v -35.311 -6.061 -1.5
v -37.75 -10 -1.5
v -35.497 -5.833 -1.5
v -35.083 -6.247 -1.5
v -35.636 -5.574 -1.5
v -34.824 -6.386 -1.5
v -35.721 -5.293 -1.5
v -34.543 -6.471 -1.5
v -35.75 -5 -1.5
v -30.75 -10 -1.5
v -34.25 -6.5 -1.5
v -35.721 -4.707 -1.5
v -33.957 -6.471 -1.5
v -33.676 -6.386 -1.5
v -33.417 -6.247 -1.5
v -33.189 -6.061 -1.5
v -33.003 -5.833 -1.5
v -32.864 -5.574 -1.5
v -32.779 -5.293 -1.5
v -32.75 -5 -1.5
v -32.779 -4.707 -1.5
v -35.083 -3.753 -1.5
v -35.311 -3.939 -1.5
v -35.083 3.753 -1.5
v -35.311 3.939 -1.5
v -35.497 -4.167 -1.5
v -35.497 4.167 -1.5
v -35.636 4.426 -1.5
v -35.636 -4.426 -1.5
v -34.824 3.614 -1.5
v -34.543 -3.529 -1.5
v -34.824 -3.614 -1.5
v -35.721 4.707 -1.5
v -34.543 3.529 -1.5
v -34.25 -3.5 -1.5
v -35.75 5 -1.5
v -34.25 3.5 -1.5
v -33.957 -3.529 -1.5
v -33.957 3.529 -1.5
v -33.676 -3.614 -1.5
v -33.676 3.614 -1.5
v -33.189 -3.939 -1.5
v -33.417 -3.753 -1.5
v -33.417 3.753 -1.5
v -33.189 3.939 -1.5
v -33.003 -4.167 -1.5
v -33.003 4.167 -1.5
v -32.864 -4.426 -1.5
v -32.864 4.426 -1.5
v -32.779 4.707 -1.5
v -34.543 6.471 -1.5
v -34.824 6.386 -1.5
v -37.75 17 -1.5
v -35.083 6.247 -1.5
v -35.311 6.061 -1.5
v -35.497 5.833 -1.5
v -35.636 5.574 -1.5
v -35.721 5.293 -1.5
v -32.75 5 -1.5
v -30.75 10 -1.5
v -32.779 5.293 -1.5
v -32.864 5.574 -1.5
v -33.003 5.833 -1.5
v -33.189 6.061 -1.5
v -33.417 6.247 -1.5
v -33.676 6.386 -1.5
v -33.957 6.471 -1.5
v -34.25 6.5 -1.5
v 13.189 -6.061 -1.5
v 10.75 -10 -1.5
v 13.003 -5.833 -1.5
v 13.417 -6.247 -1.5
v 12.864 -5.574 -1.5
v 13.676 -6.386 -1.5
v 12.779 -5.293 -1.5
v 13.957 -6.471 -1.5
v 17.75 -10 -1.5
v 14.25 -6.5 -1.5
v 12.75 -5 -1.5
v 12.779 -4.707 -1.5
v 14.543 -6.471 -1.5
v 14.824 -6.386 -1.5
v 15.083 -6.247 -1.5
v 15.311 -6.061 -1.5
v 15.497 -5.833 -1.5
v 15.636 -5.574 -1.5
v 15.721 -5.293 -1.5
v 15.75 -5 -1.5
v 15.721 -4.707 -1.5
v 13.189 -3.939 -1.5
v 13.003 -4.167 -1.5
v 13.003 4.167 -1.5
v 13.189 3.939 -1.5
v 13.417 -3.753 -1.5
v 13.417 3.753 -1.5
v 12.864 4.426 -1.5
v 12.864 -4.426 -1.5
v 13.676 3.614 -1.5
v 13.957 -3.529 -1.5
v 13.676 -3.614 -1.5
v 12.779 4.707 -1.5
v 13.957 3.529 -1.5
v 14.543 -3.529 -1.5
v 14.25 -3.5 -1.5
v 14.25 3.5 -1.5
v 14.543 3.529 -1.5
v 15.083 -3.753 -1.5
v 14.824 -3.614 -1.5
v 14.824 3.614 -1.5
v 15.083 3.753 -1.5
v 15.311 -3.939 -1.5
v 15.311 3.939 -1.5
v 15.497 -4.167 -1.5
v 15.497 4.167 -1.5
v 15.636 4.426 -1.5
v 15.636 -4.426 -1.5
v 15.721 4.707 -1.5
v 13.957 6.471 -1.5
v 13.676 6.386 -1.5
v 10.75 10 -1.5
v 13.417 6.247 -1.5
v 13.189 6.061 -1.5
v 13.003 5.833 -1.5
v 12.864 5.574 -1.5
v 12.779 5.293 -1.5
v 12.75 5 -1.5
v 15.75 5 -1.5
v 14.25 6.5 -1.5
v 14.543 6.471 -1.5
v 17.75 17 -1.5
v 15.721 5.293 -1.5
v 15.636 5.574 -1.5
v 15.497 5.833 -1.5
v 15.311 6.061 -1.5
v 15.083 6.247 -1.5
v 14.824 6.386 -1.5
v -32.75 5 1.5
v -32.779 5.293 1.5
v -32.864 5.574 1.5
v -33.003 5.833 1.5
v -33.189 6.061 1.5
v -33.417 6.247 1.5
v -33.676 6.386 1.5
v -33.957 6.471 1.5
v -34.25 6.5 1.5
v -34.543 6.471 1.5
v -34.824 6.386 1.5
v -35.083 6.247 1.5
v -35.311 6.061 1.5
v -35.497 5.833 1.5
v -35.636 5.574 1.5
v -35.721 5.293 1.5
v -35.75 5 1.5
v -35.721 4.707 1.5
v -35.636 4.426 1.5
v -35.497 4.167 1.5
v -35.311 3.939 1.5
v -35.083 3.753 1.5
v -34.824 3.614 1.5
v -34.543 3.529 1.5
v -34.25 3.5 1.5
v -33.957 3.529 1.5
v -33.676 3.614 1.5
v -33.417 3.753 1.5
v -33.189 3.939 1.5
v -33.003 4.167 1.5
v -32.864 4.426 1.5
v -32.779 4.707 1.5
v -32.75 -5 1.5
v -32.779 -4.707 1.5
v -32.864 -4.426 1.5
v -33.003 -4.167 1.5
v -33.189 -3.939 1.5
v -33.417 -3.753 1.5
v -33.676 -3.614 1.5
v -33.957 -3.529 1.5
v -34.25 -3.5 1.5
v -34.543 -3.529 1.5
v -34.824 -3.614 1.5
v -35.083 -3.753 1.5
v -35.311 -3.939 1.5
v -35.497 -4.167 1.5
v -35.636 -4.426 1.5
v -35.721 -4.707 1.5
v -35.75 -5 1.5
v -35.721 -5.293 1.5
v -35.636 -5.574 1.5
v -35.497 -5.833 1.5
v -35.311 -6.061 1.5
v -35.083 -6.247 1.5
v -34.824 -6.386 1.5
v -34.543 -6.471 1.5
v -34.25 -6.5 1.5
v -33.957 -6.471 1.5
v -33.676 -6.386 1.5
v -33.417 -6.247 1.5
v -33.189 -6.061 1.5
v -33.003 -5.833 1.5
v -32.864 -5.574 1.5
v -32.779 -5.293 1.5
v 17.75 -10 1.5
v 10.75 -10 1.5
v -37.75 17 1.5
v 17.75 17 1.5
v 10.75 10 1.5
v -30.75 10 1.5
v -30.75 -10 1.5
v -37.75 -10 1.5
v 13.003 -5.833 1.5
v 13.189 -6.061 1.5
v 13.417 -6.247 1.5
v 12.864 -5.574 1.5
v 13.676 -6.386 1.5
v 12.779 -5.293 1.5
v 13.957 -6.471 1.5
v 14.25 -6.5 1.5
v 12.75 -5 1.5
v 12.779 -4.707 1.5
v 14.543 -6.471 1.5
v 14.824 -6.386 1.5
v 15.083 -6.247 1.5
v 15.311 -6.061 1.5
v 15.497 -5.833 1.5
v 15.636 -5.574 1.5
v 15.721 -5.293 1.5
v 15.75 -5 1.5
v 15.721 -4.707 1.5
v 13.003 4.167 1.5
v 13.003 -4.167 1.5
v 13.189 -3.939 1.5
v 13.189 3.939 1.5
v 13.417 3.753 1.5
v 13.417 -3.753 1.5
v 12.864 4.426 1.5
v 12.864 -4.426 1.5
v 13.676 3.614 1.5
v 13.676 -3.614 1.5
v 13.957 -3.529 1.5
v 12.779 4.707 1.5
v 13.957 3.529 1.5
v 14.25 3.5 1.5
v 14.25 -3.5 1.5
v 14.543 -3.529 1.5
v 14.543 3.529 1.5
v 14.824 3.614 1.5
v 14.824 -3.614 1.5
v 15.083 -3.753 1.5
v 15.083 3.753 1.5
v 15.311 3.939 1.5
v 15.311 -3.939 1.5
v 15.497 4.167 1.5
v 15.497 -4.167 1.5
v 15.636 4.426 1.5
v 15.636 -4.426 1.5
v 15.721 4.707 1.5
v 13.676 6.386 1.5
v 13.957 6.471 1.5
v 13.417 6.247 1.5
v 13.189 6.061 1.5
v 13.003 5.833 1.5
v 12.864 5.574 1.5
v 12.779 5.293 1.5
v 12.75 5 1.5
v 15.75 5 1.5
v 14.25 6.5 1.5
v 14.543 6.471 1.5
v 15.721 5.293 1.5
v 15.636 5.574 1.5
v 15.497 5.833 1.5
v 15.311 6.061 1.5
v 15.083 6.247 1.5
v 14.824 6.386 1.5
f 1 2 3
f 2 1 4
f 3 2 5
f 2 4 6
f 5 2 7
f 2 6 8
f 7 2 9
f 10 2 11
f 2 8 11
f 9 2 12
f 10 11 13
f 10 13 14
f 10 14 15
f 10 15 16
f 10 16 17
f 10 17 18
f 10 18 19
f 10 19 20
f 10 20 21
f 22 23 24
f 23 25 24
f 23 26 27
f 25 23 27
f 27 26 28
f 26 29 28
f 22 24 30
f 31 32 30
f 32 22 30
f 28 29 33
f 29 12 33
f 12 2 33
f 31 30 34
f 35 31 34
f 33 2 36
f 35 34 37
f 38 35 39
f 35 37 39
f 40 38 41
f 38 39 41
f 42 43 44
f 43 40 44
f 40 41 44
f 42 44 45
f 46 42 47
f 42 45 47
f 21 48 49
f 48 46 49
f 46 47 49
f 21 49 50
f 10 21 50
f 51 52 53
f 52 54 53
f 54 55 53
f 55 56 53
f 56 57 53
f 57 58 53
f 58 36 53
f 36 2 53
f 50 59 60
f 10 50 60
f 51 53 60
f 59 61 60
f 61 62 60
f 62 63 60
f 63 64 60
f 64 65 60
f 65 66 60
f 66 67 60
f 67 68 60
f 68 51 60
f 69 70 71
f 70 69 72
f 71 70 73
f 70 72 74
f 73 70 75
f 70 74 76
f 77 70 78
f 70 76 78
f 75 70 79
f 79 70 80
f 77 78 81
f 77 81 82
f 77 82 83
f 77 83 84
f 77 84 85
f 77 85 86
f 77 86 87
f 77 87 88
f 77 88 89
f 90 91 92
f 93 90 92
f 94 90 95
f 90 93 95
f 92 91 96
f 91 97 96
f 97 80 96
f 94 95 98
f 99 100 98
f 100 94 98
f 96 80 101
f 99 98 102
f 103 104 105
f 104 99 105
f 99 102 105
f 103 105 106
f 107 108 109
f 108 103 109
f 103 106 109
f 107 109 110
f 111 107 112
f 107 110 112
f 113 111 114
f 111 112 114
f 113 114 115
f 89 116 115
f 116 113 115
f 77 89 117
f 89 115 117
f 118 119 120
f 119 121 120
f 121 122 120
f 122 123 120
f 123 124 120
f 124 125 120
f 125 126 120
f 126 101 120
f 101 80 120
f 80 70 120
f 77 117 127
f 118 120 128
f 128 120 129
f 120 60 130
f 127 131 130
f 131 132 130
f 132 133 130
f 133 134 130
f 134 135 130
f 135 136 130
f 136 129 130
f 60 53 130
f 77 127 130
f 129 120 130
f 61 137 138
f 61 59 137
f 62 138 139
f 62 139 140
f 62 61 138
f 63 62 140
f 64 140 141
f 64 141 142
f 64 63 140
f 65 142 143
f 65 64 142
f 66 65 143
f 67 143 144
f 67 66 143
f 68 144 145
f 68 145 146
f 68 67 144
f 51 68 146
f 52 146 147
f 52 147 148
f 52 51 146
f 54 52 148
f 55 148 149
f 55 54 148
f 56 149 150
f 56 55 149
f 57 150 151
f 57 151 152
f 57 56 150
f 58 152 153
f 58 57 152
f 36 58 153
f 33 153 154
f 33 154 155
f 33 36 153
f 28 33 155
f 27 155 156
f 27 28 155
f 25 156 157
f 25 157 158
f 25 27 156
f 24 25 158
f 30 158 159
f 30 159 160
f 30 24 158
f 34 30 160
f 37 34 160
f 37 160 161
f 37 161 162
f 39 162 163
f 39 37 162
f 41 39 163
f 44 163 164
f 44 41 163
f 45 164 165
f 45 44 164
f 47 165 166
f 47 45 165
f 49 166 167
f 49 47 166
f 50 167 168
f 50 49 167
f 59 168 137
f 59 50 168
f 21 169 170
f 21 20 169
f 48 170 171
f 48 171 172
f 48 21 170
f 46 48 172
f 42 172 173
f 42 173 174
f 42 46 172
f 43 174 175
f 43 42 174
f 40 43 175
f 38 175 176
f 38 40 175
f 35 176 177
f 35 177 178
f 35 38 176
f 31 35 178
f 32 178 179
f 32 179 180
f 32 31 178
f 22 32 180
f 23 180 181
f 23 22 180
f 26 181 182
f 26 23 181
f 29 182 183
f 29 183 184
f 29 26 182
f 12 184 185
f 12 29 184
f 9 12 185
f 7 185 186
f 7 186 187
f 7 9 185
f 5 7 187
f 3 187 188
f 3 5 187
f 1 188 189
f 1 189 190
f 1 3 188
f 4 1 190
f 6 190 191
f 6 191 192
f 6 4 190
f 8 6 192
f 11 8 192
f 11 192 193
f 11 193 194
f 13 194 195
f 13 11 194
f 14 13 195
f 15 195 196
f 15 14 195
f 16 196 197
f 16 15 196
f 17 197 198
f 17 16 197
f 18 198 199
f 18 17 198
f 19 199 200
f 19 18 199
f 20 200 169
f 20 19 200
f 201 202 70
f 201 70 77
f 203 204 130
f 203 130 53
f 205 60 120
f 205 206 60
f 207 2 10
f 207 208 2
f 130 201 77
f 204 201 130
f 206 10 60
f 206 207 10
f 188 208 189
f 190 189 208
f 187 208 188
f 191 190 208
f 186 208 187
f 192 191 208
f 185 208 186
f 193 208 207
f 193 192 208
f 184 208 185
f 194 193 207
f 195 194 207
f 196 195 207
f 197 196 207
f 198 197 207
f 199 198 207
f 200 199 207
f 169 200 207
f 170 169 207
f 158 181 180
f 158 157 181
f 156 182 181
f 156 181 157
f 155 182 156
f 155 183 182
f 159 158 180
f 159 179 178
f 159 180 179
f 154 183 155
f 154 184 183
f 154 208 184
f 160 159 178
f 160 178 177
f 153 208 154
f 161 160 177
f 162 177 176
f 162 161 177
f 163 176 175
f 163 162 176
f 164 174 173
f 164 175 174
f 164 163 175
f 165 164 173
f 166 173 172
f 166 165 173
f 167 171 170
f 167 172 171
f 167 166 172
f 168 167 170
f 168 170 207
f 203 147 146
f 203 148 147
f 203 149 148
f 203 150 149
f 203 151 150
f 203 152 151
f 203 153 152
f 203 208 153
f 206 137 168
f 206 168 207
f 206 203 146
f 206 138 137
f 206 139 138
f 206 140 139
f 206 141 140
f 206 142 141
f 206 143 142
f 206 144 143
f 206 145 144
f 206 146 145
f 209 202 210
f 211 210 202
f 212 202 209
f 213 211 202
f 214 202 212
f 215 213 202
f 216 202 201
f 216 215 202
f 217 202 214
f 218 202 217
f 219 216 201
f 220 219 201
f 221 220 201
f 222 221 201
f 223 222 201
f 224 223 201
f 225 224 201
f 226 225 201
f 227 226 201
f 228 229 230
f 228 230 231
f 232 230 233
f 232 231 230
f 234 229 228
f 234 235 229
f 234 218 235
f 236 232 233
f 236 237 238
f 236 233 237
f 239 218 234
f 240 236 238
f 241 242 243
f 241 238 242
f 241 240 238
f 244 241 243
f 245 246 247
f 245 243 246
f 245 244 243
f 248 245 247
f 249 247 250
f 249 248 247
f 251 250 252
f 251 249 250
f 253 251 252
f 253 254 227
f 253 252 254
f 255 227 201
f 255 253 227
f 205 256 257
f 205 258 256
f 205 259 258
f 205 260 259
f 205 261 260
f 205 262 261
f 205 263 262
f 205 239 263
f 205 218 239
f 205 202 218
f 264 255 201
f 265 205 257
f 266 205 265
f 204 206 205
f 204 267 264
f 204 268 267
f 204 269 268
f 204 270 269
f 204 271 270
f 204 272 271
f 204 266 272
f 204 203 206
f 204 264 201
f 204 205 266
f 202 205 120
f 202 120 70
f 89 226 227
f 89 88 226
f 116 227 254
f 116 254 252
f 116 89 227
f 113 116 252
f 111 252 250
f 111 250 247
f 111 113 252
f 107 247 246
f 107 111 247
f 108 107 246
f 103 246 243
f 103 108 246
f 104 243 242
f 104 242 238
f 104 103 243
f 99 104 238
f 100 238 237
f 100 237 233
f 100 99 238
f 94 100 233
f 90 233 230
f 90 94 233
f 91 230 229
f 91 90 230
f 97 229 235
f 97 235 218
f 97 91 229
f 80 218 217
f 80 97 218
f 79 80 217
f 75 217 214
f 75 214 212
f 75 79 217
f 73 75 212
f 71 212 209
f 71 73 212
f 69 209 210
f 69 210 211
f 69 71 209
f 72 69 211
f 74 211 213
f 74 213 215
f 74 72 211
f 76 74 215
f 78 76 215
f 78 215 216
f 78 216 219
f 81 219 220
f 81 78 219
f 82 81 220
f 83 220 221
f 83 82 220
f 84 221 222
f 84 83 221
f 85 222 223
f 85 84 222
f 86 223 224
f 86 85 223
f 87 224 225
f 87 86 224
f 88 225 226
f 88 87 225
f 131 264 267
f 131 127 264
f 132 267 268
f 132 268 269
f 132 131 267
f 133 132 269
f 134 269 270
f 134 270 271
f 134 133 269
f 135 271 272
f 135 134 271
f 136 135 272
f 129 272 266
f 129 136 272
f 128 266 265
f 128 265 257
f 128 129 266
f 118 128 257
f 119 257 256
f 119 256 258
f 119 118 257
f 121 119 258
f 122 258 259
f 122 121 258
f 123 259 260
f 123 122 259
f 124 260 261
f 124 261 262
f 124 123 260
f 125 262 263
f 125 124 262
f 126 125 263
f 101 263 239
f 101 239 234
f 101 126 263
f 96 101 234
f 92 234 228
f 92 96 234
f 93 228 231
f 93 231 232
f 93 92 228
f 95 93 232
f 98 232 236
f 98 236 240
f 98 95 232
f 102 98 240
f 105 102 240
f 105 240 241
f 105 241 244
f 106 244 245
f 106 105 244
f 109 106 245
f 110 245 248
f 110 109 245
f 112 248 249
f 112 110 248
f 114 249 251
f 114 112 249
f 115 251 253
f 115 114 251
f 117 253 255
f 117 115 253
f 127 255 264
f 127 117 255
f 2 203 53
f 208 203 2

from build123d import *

# Parameters (mm, degrees)
SKIZZE3_R                       = 1.5
AUFSATZ_LINEAR_AUSTRAGEN1_DEPTH = 1.5


with BuildPart() as part:
    # Skizze3 → Aufsatz-Linear austragen1 (new body, symmetric)
    with BuildSketch(Plane.XY):
        Polygon((-30.75, 10), (10.75, 10), (10.75, -10), (17.75, -10), (17.75, 17), (-37.75, 17), (-37.75, -10), (-30.75, -10), align=None)
        with Locations((-34.25, 5)):
            Circle(SKIZZE3_R, mode=Mode.SUBTRACT)
        with Locations((-34.25, -5)):
            Circle(SKIZZE3_R, mode=Mode.SUBTRACT)
        with Locations((14.25, 5)):
            Circle(SKIZZE3_R, mode=Mode.SUBTRACT)
        with Locations((14.25, -5)):
            Circle(SKIZZE3_R, mode=Mode.SUBTRACT)
    extrude(amount=AUFSATZ_LINEAR_AUSTRAGEN1_DEPTH, both=True)


solid = part.part
